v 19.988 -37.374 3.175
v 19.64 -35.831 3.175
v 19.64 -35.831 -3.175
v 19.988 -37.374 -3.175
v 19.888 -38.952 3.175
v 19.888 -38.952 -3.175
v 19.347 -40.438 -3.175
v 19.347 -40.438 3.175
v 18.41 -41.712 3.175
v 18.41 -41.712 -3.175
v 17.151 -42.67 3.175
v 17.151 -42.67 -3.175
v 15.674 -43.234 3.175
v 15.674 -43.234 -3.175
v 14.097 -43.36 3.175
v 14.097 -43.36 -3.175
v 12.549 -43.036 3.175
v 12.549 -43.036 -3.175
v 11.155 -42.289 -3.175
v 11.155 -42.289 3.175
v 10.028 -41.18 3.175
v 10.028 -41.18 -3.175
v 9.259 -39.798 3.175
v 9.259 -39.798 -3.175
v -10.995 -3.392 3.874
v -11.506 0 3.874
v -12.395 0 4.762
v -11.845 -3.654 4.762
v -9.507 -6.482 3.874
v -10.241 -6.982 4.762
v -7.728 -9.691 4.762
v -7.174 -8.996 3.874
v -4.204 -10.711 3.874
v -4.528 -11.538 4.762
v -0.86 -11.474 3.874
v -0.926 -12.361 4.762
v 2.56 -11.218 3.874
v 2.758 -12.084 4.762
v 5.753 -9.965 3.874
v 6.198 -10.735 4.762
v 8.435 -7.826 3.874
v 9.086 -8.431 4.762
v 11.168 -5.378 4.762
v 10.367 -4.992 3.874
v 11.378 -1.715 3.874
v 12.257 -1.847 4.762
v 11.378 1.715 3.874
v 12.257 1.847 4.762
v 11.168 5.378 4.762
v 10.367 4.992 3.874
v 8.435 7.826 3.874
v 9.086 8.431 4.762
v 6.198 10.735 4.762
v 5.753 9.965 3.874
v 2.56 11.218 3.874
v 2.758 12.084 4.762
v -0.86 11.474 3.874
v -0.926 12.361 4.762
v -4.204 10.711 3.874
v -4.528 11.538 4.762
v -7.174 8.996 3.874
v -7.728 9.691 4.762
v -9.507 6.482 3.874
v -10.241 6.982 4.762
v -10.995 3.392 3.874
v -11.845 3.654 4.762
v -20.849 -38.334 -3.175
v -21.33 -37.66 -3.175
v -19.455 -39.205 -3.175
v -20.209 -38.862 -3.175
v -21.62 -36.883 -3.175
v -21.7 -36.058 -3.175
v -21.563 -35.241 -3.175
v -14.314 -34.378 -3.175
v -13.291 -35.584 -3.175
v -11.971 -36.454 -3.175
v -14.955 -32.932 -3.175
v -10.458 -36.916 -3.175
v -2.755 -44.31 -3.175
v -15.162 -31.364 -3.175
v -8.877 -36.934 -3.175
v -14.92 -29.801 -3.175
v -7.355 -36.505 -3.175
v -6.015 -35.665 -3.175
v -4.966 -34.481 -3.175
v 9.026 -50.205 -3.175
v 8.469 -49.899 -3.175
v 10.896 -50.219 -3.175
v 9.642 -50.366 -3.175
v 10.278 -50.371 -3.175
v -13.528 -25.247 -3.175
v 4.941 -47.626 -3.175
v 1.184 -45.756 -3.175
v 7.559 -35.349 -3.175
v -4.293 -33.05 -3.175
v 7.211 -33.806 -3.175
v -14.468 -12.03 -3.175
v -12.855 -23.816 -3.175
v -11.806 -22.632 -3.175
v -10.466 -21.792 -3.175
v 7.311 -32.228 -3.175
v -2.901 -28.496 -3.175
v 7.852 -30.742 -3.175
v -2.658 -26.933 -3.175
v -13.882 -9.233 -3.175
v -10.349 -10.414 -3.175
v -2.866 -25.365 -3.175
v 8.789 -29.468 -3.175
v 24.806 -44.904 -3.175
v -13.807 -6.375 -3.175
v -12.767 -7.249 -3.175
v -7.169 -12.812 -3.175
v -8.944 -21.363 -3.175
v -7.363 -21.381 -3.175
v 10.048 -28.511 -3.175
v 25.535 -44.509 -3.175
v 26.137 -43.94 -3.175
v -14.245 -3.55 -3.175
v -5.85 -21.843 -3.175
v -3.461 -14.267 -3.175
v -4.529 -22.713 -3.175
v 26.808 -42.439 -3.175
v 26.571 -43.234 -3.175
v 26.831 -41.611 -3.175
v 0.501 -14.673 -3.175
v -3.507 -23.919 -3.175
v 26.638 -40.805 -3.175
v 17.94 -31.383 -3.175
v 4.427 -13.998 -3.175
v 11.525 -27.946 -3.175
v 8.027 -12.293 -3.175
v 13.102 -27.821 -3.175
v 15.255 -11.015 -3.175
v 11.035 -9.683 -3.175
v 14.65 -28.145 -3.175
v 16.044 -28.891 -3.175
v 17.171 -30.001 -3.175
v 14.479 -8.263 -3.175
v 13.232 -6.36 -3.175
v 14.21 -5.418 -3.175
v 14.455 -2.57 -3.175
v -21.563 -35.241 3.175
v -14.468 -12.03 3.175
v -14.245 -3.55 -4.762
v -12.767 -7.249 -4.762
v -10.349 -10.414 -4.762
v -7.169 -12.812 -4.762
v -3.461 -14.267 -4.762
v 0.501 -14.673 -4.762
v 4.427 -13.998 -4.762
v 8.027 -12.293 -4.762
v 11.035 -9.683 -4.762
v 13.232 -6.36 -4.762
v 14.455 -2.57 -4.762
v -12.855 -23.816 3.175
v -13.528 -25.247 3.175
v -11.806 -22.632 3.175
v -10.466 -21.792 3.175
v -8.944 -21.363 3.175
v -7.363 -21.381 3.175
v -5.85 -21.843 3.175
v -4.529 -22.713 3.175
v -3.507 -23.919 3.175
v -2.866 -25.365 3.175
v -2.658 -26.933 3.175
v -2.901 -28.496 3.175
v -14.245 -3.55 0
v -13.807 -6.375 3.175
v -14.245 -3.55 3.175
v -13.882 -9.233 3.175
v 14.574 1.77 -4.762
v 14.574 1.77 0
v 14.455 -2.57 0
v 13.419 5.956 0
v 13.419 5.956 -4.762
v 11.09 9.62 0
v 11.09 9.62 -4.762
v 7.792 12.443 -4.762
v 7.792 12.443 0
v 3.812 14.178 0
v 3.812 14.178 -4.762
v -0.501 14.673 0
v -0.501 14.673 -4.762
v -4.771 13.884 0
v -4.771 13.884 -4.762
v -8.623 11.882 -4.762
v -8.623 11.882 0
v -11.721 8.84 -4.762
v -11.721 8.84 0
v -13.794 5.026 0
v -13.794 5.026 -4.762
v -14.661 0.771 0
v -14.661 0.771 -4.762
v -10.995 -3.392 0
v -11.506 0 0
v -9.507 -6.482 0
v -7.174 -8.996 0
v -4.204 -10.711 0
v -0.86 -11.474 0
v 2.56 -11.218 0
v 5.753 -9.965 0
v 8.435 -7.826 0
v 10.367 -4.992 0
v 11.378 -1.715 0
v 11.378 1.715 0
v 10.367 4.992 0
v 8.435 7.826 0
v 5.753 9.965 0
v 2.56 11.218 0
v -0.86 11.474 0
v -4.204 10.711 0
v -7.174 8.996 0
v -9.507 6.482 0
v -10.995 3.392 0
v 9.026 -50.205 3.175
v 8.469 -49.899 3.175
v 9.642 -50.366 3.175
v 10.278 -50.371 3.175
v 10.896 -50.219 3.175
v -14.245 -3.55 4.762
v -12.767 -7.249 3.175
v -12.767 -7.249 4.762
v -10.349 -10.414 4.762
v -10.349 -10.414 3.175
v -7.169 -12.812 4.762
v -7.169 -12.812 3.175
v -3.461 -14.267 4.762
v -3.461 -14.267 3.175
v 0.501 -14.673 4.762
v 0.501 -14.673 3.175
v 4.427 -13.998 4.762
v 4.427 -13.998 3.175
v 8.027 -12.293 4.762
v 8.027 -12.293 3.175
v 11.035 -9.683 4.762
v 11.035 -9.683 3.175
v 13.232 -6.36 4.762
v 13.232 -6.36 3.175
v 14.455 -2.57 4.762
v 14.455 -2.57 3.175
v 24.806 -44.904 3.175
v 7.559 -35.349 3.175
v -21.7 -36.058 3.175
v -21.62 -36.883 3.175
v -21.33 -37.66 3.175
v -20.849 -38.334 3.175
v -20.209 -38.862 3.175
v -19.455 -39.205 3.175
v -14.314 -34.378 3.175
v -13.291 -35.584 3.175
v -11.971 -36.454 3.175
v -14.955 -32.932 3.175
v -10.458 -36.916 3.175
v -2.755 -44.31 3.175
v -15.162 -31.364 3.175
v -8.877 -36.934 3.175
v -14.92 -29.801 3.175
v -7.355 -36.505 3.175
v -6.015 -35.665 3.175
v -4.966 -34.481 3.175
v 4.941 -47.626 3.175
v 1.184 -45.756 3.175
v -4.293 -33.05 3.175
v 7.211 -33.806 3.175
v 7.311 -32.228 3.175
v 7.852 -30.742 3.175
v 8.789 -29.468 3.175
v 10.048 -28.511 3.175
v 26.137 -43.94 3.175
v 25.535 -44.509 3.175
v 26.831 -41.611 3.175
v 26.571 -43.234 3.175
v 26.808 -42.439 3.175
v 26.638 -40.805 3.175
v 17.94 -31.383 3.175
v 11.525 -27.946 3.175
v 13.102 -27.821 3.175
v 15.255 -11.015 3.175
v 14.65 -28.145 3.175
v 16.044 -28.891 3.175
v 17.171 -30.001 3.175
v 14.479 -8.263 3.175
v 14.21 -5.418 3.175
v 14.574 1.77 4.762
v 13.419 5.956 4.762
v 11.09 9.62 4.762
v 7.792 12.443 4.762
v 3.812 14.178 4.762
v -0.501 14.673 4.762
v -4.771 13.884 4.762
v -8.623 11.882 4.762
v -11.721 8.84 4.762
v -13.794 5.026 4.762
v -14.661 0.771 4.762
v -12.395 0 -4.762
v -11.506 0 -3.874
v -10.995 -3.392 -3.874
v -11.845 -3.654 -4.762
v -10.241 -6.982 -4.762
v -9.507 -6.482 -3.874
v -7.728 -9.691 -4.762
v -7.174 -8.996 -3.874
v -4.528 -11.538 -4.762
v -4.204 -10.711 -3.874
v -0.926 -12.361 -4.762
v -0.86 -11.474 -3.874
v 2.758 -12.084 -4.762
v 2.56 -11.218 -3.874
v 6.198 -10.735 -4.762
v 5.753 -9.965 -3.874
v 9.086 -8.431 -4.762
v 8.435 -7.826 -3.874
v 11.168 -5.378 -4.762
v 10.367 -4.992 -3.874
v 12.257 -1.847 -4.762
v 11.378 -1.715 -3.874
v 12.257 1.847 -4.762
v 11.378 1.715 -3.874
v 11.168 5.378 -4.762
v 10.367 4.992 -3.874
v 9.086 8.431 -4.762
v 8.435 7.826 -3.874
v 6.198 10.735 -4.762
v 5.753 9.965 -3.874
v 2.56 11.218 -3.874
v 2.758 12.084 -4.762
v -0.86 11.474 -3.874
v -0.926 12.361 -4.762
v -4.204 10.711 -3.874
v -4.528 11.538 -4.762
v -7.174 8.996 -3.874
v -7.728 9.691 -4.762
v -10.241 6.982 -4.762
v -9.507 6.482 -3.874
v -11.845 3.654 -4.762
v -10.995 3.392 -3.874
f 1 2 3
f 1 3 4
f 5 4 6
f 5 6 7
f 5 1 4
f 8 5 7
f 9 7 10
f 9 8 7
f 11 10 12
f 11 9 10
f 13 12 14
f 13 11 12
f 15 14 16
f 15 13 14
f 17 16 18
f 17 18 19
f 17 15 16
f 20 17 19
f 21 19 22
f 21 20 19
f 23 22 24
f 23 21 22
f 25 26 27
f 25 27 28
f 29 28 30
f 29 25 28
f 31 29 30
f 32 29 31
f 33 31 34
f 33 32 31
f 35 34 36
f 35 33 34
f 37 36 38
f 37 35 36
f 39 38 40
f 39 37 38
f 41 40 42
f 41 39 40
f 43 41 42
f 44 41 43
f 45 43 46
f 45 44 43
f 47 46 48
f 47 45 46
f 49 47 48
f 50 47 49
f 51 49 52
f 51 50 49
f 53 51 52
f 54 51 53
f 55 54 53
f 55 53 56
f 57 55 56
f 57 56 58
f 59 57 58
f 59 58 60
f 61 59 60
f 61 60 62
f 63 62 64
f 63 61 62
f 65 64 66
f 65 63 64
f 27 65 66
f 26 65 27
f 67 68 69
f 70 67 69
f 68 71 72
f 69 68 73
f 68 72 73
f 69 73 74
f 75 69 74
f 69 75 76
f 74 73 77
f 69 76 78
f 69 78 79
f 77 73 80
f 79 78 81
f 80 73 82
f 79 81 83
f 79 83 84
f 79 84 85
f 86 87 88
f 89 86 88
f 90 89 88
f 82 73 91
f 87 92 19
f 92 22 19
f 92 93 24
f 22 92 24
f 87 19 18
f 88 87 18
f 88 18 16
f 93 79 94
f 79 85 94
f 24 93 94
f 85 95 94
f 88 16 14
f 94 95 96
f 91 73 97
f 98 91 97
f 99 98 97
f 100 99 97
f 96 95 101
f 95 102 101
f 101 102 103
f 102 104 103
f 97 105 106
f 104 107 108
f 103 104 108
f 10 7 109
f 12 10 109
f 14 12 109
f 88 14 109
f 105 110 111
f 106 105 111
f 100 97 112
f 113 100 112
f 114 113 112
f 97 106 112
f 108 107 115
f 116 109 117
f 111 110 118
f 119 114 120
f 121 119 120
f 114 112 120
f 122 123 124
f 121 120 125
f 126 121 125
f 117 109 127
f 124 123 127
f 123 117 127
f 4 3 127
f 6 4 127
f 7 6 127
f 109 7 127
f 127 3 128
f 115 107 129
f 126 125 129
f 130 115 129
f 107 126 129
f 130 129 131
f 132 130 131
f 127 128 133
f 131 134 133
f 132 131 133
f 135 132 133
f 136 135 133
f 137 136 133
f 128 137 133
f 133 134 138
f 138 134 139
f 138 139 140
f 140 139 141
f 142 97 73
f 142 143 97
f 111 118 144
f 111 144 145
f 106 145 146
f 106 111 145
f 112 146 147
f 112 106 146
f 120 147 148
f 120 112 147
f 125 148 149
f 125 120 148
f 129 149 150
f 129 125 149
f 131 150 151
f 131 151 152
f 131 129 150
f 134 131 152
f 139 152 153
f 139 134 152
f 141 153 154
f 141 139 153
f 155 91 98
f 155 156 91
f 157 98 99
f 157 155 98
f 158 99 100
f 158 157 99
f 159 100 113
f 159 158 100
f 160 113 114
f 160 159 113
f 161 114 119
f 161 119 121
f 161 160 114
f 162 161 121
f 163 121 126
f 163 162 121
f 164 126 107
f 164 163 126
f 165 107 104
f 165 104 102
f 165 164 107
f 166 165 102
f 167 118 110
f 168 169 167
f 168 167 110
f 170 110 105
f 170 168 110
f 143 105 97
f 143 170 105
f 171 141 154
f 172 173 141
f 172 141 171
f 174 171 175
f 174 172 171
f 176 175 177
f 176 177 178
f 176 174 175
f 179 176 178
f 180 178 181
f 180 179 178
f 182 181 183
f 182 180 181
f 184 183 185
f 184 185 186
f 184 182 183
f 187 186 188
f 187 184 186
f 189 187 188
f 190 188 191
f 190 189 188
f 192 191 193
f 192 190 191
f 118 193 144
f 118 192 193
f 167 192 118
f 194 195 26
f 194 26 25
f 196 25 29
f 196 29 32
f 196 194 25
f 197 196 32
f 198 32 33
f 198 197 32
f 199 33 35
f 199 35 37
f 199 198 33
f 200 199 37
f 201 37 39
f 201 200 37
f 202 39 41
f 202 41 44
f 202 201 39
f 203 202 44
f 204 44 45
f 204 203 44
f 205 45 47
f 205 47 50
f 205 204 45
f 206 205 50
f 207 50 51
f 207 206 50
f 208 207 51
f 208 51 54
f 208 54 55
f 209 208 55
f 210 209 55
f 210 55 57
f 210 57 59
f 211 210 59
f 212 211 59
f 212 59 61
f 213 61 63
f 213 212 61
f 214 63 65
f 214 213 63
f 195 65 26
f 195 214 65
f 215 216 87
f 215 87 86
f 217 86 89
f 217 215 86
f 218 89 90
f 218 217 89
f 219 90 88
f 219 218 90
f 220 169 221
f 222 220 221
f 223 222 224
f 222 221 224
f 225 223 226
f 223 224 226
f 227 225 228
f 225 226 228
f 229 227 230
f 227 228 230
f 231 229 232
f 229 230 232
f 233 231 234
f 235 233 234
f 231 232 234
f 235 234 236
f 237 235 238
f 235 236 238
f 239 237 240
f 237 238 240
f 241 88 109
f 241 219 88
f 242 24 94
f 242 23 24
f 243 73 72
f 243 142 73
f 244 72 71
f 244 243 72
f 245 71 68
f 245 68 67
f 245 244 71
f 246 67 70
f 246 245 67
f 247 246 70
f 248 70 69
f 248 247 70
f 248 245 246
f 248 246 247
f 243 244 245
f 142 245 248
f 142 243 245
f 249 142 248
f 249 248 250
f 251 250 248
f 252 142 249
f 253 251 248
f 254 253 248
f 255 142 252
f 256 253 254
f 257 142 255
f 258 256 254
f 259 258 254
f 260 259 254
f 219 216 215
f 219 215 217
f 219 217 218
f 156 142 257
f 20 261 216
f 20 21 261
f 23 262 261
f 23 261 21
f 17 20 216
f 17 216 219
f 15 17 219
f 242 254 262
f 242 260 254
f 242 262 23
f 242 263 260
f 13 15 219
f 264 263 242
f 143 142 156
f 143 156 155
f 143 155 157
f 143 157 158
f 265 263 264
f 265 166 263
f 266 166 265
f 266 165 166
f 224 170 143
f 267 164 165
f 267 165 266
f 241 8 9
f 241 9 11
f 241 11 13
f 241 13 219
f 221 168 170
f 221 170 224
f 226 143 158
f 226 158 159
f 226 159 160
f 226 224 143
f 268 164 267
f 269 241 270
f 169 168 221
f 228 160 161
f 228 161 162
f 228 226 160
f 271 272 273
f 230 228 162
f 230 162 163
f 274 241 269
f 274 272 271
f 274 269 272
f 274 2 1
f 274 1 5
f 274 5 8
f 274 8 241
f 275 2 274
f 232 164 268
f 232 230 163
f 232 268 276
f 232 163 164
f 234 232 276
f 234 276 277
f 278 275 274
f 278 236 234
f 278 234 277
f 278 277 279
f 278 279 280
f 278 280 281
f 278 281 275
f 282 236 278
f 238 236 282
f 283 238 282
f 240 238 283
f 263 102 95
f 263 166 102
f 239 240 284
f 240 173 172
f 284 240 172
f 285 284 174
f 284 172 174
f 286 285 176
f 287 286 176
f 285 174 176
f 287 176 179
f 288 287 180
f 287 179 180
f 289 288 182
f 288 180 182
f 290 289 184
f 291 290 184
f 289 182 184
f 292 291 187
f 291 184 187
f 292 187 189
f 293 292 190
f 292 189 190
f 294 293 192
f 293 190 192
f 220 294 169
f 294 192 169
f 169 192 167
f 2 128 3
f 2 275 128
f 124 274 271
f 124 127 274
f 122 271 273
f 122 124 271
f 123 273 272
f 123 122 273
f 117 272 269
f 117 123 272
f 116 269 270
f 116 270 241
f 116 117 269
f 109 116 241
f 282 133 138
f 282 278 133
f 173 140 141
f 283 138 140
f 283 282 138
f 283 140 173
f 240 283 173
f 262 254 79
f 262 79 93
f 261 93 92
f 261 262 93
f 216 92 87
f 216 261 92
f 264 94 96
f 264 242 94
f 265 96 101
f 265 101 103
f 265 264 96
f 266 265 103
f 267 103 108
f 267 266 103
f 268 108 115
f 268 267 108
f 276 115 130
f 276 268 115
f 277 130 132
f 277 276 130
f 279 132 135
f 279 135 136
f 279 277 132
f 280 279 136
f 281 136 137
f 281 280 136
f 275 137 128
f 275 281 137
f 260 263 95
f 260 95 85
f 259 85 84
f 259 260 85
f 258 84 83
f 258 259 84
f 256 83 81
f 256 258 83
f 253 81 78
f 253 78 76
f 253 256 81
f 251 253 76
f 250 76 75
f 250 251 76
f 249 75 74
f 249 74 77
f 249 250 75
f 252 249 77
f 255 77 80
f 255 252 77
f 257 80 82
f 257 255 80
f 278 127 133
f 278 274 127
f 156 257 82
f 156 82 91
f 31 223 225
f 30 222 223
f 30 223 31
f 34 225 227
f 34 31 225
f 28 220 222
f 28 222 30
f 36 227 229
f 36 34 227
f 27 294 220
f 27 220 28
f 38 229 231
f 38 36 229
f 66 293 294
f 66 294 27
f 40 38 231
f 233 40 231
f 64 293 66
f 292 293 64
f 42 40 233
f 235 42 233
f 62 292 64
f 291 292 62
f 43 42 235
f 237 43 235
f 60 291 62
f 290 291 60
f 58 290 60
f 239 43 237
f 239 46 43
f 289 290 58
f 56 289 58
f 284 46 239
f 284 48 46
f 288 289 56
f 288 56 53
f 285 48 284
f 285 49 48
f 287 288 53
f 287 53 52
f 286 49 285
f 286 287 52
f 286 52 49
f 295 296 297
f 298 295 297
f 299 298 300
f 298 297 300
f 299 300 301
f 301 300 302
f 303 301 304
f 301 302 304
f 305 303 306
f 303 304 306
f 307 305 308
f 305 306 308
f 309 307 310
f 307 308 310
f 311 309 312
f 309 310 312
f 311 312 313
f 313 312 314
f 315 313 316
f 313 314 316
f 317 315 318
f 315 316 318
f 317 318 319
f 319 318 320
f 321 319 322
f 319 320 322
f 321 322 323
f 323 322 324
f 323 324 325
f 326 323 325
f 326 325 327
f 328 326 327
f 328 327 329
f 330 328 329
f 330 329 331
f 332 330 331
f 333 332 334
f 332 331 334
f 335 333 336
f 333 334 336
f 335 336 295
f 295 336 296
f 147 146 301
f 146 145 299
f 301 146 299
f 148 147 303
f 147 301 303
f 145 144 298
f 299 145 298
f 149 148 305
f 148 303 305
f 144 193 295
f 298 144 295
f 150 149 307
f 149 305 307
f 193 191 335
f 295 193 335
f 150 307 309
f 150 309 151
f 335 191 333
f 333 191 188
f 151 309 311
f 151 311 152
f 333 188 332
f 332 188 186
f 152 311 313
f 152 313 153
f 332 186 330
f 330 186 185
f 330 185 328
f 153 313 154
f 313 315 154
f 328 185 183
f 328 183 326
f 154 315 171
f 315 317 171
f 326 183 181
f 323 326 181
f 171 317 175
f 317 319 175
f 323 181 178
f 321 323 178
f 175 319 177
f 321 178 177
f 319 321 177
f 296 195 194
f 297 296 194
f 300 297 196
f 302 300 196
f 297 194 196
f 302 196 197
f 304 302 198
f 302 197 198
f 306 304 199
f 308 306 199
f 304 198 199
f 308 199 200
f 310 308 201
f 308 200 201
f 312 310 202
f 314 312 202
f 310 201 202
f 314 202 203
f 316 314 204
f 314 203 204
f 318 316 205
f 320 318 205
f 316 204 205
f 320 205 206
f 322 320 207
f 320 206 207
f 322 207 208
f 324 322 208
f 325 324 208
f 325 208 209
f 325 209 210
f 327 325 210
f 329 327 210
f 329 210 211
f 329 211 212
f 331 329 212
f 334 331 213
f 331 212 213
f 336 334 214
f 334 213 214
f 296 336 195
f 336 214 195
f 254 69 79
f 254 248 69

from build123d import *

# Parameters (mm, degrees)
SKETCH1_R           = 11.5062
BOSS_EXTRUDE2_DEPTH = 4.7625
BOSS_EXTRUDE3_DEPTH = 3.175
FILLET1_R           = 3.175
CHAMFER1_SIZE       = 0.889


with BuildPart() as part:
    # Sketch1 → Boss-Extrude2 (new, symmetric)
    with BuildSketch(Plane.XY):
        with BuildLine():
            ThreePointArc((14.454574535, -2.569612511), (-0.50143503, 14.672634268), (-14.245423001, -3.550430532))
            ThreePointArc((-14.245423001, -3.550430532), (0.50143503, -14.672634268), (14.454574535, -2.569612511))
        make_face()
        Circle(SKETCH1_R, mode=Mode.SUBTRACT)
    extrude(amount=BOSS_EXTRUDE2_DEPTH, both=True)

    # Sketch1<4> → Boss-Extrude3 (add, symmetric)
    with BuildSketch(Plane.XY):
        with BuildLine():
            ThreePointArc((-14.245423001, -3.550430532), (-13.779661889, -7.805545679), (-14.467705296, -12.030416635))
            Line((-14.467705296, -12.030416635), (-22.491098066, -38.27714082))
            Line((-22.491098066, -38.27714082), (-2.755140848, -44.310249384))
            ThreePointArc((-2.755140848, -44.310249384), (3.08819115, -46.639517528), (8.468620942, -49.898504209))
            ThreePointArc((8.468620942, -49.898504209), (9.641965512, -50.366054867), (10.896408583, -50.218699247))
            Line((10.896408583, -50.218699247), (27.771706227, -43.770411636))
            Line((27.771706227, -43.770411636), (15.255266531, -11.014638624))
            ThreePointArc((15.255266531, -11.014638624), (14.280396638, -6.846597475), (14.454574535, -2.569612511))
            ThreePointArc((14.454574535, -2.569612511), (0.50143503, -14.672634268), (-14.245423001, -3.550430532))
        make_face()
        with BuildLine():
            ThreePointArc((-4.293038232, -33.050014953), (-11.230863635, -36.739243436), (-14.920092118, -29.801418033))
            Line((-14.920092118, -29.801418033), (-13.527836296, -25.246966368))
            ThreePointArc((-13.527836296, -25.246966368), (-6.590010893, -21.557737884), (-2.900782409, -28.495563287))
            Line((-2.900782409, -28.495563287), (-4.293038232, -33.050014953))
        make_face(mode=Mode.SUBTRACT)
        with BuildLine():
            ThreePointArc((19.639727055, -35.831335962), (16.432751029, -43.004838098), (9.259248893, -39.797862073))
            Line((9.259248893, -39.797862073), (7.559309131, -35.349085718))
            ThreePointArc((7.559309131, -35.349085718), (10.766285157, -28.175583582), (17.939787293, -31.382559607))
            Line((17.939787293, -31.382559607), (19.639727055, -35.831335962))
        make_face(mode=Mode.SUBTRACT)
    extrude(amount=BOSS_EXTRUDE3_DEPTH, both=True)

    # Fillet1
    fillet1_edges = [part.edges().sort_by_distance(p)[0] for p in [
        (-22.491098066, -38.27714082, 0),
        (27.771706227, -43.770411636, 0),
    ]]
    fillet(fillet1_edges, radius=FILLET1_R)

    # Chamfer1
    chamfer1_edges = [part.edges().sort_by_distance(p)[0] for p in [
        (-11.5062, 0, -4.7625),
        (-11.5062, 0, 4.7625),
    ]]
    chamfer(chamfer1_edges, length=CHAMFER1_SIZE)


solid = part.part
